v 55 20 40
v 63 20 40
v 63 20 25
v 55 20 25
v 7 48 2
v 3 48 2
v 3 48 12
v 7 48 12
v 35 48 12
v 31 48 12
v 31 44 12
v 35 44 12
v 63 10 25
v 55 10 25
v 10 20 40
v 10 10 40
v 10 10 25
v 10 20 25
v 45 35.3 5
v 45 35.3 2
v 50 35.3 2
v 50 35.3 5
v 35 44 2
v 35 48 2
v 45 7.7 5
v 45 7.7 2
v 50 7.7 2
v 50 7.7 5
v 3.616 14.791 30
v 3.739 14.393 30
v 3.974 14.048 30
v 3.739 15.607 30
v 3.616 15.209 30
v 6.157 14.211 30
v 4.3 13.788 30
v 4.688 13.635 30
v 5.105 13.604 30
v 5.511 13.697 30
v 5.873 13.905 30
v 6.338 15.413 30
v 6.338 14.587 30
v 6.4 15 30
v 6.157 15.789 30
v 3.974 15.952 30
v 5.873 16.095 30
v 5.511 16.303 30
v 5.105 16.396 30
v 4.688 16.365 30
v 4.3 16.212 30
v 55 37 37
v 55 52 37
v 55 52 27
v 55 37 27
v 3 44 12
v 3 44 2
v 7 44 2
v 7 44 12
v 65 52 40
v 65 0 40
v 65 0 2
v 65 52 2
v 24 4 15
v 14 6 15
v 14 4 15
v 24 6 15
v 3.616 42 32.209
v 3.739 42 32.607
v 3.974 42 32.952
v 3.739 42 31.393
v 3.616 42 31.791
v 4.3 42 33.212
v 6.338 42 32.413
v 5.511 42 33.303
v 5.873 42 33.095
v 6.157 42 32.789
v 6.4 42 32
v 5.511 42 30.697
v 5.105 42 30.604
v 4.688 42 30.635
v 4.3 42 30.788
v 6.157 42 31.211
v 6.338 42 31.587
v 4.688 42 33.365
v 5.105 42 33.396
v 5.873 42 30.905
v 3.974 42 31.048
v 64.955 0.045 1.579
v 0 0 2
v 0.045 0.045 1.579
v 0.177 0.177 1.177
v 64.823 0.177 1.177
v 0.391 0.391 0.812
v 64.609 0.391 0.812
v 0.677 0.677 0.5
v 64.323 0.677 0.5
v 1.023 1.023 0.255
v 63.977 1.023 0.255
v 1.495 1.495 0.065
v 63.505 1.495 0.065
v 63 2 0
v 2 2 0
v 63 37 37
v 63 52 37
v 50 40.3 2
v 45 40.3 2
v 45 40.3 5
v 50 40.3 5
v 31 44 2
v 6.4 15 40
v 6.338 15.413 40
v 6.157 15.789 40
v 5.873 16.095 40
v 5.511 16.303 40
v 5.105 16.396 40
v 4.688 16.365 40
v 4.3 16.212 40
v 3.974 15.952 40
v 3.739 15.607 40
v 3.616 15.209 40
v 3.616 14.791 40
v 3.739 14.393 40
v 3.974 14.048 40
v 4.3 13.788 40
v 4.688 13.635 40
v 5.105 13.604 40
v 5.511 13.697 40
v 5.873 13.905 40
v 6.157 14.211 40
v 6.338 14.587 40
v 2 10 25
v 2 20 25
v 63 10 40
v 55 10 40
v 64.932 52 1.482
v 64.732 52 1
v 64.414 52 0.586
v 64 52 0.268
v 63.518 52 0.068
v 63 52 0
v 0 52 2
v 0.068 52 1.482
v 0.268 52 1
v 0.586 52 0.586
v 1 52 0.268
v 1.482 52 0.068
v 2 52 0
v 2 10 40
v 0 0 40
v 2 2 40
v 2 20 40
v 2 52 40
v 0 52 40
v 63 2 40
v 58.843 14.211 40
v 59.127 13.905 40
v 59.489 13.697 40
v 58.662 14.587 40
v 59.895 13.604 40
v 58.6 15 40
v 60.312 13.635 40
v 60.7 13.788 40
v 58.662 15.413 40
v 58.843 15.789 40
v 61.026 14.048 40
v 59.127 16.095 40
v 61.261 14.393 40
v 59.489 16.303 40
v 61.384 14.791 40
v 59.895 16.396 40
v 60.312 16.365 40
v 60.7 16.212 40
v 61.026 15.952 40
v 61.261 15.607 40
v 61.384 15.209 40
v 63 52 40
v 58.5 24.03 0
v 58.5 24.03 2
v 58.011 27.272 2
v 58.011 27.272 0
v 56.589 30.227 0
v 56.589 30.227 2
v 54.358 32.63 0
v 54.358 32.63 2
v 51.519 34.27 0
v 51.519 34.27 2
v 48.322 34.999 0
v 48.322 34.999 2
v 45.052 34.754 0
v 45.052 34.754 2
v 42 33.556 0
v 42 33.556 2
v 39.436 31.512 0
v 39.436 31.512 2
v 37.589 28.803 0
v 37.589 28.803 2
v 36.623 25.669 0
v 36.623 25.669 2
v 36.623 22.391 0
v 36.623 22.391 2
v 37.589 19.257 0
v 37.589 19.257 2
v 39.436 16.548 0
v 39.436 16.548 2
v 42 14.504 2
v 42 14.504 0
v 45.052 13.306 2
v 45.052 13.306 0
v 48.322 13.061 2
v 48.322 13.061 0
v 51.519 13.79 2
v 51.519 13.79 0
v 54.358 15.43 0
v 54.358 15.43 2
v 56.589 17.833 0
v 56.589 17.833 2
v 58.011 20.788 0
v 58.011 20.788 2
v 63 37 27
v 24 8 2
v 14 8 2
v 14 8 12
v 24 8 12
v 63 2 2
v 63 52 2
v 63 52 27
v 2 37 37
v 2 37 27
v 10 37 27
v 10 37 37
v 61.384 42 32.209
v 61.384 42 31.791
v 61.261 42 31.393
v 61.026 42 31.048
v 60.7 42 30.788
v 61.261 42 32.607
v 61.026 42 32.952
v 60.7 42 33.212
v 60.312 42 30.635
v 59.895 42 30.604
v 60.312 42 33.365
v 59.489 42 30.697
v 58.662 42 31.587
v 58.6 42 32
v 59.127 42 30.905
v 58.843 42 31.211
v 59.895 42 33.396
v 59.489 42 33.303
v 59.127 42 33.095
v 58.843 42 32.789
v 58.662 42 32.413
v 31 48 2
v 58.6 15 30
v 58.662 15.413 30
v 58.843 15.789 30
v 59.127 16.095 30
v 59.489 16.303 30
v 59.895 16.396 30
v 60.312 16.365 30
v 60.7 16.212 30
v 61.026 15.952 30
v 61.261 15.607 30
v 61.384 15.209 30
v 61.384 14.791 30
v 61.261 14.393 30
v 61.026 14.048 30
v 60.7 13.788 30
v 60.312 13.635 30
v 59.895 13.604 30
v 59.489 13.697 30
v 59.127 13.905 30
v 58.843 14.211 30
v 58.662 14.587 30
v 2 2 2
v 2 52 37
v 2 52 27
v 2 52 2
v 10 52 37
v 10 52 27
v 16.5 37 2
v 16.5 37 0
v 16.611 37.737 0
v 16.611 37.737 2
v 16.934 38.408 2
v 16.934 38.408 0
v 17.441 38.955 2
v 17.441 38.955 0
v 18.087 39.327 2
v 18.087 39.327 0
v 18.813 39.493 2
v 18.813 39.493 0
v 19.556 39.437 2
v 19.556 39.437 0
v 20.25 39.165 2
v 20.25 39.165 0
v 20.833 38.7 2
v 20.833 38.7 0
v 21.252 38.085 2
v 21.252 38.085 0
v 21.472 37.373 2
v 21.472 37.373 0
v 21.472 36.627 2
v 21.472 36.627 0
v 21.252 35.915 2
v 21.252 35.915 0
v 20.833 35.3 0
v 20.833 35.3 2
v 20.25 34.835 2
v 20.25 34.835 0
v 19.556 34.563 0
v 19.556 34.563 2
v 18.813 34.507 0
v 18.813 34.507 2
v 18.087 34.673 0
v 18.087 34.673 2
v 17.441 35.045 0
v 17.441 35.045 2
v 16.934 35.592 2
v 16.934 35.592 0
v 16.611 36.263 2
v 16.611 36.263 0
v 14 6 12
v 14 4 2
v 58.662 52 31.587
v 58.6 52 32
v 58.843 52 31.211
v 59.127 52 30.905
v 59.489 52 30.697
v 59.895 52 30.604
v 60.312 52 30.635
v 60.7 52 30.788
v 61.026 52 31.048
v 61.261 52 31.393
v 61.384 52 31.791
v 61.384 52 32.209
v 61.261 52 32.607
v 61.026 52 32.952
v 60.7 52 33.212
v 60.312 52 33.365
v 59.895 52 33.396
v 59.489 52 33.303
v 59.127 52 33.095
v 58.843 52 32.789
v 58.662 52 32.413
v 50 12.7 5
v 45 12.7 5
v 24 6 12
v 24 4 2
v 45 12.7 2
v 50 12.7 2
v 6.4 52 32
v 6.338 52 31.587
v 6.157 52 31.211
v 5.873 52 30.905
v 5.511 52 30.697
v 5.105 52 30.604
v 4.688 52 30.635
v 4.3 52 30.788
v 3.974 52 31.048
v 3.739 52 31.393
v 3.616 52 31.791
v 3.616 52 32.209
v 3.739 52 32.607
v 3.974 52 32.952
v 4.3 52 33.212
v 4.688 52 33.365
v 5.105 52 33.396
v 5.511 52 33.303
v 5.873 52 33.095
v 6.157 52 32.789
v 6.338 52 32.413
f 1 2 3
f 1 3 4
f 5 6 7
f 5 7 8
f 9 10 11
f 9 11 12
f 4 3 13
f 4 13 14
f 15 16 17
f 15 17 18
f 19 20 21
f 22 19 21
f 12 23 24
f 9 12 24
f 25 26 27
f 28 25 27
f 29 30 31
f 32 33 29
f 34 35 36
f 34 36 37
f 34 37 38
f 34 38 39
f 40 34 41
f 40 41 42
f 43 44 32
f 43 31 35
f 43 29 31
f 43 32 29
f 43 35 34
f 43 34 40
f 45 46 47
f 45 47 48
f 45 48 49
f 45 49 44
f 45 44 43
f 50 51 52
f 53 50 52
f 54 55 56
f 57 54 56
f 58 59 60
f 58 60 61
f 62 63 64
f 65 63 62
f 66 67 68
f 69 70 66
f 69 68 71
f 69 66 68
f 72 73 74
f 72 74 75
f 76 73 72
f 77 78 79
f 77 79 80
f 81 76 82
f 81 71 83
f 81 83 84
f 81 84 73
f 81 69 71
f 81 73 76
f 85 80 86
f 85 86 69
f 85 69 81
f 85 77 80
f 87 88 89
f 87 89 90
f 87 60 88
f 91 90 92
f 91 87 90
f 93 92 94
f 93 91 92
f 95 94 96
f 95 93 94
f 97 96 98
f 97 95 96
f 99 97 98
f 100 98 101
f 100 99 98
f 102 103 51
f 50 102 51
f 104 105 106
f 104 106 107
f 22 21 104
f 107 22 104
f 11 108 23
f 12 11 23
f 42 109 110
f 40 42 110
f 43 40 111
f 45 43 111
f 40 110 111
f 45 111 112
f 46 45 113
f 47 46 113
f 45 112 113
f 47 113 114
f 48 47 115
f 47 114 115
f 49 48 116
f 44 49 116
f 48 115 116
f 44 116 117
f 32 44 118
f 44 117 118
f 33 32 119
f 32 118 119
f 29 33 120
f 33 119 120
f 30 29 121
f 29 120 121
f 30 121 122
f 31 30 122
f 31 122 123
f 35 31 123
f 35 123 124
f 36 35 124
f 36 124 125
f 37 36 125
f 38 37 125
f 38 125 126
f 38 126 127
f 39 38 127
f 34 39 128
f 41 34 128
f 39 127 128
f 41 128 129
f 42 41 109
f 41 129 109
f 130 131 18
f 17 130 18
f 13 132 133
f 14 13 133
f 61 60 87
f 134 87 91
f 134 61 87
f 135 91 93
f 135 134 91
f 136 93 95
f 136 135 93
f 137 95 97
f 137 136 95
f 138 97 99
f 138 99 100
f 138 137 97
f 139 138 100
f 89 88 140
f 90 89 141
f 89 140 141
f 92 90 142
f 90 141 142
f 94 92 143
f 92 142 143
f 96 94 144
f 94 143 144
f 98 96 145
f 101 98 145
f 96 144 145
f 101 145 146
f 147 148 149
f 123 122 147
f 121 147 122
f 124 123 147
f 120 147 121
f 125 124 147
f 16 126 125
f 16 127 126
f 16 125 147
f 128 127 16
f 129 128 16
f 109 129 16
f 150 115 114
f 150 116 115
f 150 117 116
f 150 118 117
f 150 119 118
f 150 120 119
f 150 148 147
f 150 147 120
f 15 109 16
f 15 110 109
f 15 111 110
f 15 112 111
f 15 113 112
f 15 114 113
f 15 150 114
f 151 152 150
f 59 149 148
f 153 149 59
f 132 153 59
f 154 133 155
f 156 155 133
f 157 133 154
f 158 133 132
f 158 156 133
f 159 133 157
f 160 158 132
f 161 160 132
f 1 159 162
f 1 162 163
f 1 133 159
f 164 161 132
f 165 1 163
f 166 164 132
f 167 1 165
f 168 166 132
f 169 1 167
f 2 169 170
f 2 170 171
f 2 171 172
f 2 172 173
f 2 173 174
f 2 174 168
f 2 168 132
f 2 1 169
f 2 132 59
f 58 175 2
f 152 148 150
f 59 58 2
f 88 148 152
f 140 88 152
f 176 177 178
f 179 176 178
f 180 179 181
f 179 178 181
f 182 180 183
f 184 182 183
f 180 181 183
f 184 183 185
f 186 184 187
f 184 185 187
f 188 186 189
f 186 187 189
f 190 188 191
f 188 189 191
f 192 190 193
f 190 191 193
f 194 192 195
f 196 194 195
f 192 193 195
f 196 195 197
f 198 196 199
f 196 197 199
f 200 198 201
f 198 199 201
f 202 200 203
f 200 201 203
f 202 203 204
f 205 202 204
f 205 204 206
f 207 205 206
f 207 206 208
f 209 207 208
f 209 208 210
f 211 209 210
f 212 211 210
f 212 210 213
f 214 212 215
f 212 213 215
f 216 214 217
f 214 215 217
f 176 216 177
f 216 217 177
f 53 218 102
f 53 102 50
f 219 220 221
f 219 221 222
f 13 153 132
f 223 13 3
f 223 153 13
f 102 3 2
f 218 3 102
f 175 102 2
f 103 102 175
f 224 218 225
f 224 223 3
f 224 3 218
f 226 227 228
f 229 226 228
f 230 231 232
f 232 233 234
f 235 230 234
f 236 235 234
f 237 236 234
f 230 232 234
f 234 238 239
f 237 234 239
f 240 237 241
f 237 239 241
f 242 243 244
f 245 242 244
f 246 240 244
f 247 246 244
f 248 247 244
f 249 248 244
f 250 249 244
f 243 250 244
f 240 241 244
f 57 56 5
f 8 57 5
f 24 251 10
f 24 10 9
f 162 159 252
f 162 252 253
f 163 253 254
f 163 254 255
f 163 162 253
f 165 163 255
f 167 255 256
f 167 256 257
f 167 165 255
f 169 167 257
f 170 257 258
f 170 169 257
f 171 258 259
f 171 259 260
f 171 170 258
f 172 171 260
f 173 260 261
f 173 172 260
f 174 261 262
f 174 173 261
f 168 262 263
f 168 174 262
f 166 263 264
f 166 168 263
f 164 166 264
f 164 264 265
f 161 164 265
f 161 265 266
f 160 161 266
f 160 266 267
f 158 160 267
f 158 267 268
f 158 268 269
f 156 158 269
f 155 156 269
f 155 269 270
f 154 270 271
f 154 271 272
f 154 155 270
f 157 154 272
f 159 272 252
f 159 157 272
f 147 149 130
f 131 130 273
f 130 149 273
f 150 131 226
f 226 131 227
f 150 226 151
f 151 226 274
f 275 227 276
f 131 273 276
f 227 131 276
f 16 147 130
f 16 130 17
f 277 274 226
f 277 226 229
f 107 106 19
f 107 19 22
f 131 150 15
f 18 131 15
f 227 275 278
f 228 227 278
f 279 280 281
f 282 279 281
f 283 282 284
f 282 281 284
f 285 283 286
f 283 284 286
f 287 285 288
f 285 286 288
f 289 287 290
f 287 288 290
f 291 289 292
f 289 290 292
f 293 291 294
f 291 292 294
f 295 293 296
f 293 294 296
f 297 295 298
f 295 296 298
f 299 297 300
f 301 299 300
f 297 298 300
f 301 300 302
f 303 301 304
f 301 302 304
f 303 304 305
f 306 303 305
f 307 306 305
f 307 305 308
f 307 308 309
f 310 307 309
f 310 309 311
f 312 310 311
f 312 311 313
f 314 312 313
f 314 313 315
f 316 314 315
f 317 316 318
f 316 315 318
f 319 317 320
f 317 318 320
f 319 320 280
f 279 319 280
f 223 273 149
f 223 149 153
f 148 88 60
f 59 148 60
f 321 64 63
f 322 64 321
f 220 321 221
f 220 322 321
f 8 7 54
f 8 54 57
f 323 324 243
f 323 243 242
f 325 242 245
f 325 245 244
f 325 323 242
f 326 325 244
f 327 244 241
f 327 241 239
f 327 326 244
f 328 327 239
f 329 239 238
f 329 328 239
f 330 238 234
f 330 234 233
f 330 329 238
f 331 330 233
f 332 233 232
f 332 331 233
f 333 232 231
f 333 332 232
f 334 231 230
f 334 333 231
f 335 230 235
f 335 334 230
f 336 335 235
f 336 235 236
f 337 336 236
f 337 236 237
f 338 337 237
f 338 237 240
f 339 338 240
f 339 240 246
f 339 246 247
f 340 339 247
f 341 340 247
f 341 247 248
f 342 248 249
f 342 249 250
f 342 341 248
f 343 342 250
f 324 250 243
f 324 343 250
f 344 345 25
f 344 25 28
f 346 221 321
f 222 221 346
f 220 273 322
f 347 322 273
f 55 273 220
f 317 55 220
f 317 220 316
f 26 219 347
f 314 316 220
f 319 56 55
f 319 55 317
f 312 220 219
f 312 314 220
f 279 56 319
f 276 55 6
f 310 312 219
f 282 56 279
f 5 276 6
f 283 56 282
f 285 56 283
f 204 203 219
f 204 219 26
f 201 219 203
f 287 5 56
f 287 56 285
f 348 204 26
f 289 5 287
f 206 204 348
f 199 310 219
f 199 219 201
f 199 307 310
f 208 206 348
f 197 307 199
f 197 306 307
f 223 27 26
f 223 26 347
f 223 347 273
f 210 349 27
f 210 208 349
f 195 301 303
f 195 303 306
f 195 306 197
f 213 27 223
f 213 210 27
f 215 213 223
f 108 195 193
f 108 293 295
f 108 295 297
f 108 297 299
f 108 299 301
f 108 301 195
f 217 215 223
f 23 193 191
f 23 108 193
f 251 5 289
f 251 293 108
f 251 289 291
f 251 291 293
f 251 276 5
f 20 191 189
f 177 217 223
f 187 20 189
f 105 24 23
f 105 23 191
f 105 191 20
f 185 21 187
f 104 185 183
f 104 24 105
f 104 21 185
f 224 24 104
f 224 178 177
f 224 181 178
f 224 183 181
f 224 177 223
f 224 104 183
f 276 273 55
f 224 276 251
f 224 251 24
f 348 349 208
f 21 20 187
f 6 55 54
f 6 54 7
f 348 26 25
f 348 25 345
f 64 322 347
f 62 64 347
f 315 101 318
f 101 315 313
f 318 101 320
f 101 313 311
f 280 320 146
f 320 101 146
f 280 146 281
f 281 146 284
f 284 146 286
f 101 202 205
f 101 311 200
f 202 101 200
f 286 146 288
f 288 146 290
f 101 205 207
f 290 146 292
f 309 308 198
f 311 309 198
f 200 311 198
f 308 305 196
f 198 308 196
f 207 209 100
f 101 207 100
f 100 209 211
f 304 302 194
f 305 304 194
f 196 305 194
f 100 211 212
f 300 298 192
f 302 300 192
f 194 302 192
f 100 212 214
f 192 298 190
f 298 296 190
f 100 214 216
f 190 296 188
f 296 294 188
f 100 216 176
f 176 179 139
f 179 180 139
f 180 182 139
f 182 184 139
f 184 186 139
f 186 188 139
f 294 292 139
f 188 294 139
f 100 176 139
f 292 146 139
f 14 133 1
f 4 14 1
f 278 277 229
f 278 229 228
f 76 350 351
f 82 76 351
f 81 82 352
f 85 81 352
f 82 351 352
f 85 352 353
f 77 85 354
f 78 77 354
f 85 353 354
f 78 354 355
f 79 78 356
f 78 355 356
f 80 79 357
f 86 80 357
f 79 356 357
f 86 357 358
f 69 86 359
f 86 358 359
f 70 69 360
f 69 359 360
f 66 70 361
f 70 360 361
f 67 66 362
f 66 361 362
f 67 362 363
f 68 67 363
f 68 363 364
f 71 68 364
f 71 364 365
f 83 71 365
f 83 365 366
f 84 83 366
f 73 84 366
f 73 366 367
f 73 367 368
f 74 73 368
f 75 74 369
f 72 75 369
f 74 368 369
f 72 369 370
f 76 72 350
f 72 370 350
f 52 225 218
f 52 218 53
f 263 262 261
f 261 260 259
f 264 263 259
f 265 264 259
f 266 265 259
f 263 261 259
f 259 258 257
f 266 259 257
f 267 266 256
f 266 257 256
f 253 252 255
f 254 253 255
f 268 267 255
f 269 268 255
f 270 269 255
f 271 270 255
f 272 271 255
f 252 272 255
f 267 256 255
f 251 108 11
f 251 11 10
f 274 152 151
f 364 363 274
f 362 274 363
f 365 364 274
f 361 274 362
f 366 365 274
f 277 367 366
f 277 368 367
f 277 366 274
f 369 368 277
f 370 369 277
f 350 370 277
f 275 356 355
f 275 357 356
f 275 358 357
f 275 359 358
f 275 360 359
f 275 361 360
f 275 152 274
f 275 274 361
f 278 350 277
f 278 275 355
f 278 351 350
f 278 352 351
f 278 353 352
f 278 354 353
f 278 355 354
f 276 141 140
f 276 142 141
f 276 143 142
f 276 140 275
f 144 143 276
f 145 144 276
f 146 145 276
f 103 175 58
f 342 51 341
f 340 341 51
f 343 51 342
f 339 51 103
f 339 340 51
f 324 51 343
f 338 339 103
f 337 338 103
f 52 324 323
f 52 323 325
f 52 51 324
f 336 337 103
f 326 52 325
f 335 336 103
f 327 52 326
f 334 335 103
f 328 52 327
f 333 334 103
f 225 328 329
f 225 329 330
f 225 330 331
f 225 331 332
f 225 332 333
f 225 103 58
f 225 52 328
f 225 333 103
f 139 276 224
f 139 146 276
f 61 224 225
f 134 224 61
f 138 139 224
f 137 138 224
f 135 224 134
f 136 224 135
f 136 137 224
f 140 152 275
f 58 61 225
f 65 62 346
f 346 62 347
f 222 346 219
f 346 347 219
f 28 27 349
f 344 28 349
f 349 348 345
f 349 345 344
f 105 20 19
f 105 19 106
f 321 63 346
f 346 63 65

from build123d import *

# Parameters (mm, degrees)
SKETCH1_W           = 65
SKETCH1_H           = 52
BOSS_EXTRUDE1_DEPTH = 40
SHELL1_T            = -2
SKETCH7_W           = 10
SKETCH7_H           = 10
BOSS_EXTRUDE3_DEPTH = 15
SKETCH8_R           = 1.4
CUT_EXTRUDE3_DEPTH  = 10
SKETCH10_W          = 10
SKETCH10_H          = 10
BOSS_EXTRUDE4_DEPTH = 15
SKETCH11_R          = 1.4
CUT_EXTRUDE4_DEPTH  = 10
SKETCH13_R          = 2.5
CUT_EXTRUDE5_DEPTH  = 2
SKETCH16_W          = 10
SKETCH16_H          = 4
BOSS_EXTRUDE5_DEPTH = 13
SKETCH17_W          = 10
SKETCH17_H          = 2
CUT_EXTRUDE6_DEPTH  = 3
SKETCH18_W          = 4
SKETCH18_H          = 4
BOSS_EXTRUDE6_DEPTH = 10
SKETCH20_W          = 4
SKETCH20_H          = 4
BOSS_EXTRUDE7_DEPTH = 10
FILLET1_R           = 2
SKETCH22_W          = 5
SKETCH22_H          = 5
BOSS_EXTRUDE8_DEPTH = 3
SKETCH23_W          = 5
SKETCH23_H          = 5
BOSS_EXTRUDE9_DEPTH = 3
SKETCH24_R          = 11
CUT_EXTRUDE7_DEPTH  = 2


with BuildPart() as part:
    # Sketch1 → Boss-Extrude1 (new body)
    with BuildSketch(Plane.XY):
        with Locations((32.5, 26)):
            Rectangle(SKETCH1_W, SKETCH1_H)
    extrude(amount=BOSS_EXTRUDE1_DEPTH)

    # Shell1
    shell1_openings = [part.faces().sort_by_distance(p)[0] for p in [
        (32.5, 26, 40),
        (32.5, 52, 20),
    ]]
    offset(amount=SHELL1_T, openings=shell1_openings, kind=Kind.INTERSECTION)

    # Sketch7 → Boss-Extrude3 (add)
    with BuildSketch(Plane(origin=(0, 52, 0), x_dir=(1, 0, 0), z_dir=(0, 1, 0))):
        with Locations((5, -32)):
            Rectangle(SKETCH7_W, SKETCH7_H)
    boss_extrude3 = extrude(amount=-BOSS_EXTRUDE3_DEPTH)

    # Sketch8 → Cut-Extrude3 (cut)
    with BuildSketch(Plane(origin=(0, 52, 0), x_dir=(1, 0, 0), z_dir=(0, 1, 0))):
        with Locations((5, -32)):
            Circle(SKETCH8_R)
    cut_extrude3 = extrude(amount=-CUT_EXTRUDE3_DEPTH, mode=Mode.SUBTRACT)

    # Mirror3: Boss-Extrude3, Cut-Extrude3 across plane
    add(boss_extrude3.mirror(Plane(origin=(32.5, 0, 0), x_dir=(0, 0, 1), z_dir=(1, 0, 0))))
    add(cut_extrude3.mirror(Plane(origin=(32.5, 0, 0), x_dir=(0, 0, 1), z_dir=(1, 0, 0))), mode=Mode.SUBTRACT)

    # Sketch10 → Boss-Extrude4 (add)
    with BuildSketch(Plane.XY.offset(40)):
        with Locations((5, 15)):
            Rectangle(SKETCH10_W, SKETCH10_H)
    boss_extrude4 = extrude(amount=-BOSS_EXTRUDE4_DEPTH)

    # Sketch11 → Cut-Extrude4 (cut)
    with BuildSketch(Plane.XY.offset(40)):
        with Locations((5, 15)):
            Circle(SKETCH11_R)
    cut_extrude4 = extrude(amount=-CUT_EXTRUDE4_DEPTH, mode=Mode.SUBTRACT)

    # Mirror4: Boss-Extrude4, Cut-Extrude4 across plane
    add(boss_extrude4.mirror(Plane(origin=(32.5, 0, 0), x_dir=(0, 0, 1), z_dir=(1, 0, 0))))
    add(cut_extrude4.mirror(Plane(origin=(32.5, 0, 0), x_dir=(0, 0, 1), z_dir=(1, 0, 0))), mode=Mode.SUBTRACT)

    # Sketch13 → Cut-Extrude5 (cut)
    with BuildSketch(Plane(origin=(0, 0, 0), x_dir=(-1, 0, 0), z_dir=(0, 0, -1))):
        with Locations((-19, 37)):
            Circle(SKETCH13_R)
    extrude(amount=-CUT_EXTRUDE5_DEPTH, mode=Mode.SUBTRACT)

    # Sketch16 → Boss-Extrude5 (add)
    with BuildSketch(Plane.XY.offset(2)):
        with Locations((19, 6)):
            Rectangle(SKETCH16_W, SKETCH16_H)
    extrude(amount=BOSS_EXTRUDE5_DEPTH)

    # Sketch17 → Cut-Extrude6 (cut)
    with BuildSketch(Plane.XY.offset(15)):
        with Locations((19, 7)):
            Rectangle(SKETCH17_W, SKETCH17_H)
    extrude(amount=-CUT_EXTRUDE6_DEPTH, mode=Mode.SUBTRACT)

    # Sketch18 → Boss-Extrude6 (add)
    with BuildSketch(Plane.XY.offset(2)):
        with Locations((33, 46)):
            Rectangle(SKETCH18_W, SKETCH18_H)
    extrude(amount=BOSS_EXTRUDE6_DEPTH)

    # Sketch20 → Boss-Extrude7 (add)
    with BuildSketch(Plane.XY.offset(2)):
        with Locations((5, 46)):
            Rectangle(SKETCH20_W, SKETCH20_H)
    extrude(amount=BOSS_EXTRUDE7_DEPTH)

    # Fillet1
    fillet1_edges = [part.edges().sort_by_distance(p)[0] for p in [
        (65, 26, 0),
        (32.5, 0, 0),
        (0, 26, 0),
    ]]
    fillet(fillet1_edges, radius=FILLET1_R)

    # Sketch22 → Boss-Extrude8 (add)
    with BuildSketch(Plane.XY.offset(2)):
        with Locations((47.5, 37.8)):
            Rectangle(SKETCH22_W, SKETCH22_H)
    extrude(amount=BOSS_EXTRUDE8_DEPTH)

    # Sketch23 → Boss-Extrude9 (add)
    with BuildSketch(Plane.XY.offset(2)):
        with Locations((47.5, 10.2)):
            Rectangle(SKETCH23_W, SKETCH23_H)
    extrude(amount=BOSS_EXTRUDE9_DEPTH)

    # Sketch24 → Cut-Extrude7 (cut)
    with BuildSketch(Plane.XY.offset(2)):
        with Locations((47.5, 24.03)):
            Circle(SKETCH24_R)
    extrude(amount=-CUT_EXTRUDE7_DEPTH, mode=Mode.SUBTRACT)


solid = part.part
